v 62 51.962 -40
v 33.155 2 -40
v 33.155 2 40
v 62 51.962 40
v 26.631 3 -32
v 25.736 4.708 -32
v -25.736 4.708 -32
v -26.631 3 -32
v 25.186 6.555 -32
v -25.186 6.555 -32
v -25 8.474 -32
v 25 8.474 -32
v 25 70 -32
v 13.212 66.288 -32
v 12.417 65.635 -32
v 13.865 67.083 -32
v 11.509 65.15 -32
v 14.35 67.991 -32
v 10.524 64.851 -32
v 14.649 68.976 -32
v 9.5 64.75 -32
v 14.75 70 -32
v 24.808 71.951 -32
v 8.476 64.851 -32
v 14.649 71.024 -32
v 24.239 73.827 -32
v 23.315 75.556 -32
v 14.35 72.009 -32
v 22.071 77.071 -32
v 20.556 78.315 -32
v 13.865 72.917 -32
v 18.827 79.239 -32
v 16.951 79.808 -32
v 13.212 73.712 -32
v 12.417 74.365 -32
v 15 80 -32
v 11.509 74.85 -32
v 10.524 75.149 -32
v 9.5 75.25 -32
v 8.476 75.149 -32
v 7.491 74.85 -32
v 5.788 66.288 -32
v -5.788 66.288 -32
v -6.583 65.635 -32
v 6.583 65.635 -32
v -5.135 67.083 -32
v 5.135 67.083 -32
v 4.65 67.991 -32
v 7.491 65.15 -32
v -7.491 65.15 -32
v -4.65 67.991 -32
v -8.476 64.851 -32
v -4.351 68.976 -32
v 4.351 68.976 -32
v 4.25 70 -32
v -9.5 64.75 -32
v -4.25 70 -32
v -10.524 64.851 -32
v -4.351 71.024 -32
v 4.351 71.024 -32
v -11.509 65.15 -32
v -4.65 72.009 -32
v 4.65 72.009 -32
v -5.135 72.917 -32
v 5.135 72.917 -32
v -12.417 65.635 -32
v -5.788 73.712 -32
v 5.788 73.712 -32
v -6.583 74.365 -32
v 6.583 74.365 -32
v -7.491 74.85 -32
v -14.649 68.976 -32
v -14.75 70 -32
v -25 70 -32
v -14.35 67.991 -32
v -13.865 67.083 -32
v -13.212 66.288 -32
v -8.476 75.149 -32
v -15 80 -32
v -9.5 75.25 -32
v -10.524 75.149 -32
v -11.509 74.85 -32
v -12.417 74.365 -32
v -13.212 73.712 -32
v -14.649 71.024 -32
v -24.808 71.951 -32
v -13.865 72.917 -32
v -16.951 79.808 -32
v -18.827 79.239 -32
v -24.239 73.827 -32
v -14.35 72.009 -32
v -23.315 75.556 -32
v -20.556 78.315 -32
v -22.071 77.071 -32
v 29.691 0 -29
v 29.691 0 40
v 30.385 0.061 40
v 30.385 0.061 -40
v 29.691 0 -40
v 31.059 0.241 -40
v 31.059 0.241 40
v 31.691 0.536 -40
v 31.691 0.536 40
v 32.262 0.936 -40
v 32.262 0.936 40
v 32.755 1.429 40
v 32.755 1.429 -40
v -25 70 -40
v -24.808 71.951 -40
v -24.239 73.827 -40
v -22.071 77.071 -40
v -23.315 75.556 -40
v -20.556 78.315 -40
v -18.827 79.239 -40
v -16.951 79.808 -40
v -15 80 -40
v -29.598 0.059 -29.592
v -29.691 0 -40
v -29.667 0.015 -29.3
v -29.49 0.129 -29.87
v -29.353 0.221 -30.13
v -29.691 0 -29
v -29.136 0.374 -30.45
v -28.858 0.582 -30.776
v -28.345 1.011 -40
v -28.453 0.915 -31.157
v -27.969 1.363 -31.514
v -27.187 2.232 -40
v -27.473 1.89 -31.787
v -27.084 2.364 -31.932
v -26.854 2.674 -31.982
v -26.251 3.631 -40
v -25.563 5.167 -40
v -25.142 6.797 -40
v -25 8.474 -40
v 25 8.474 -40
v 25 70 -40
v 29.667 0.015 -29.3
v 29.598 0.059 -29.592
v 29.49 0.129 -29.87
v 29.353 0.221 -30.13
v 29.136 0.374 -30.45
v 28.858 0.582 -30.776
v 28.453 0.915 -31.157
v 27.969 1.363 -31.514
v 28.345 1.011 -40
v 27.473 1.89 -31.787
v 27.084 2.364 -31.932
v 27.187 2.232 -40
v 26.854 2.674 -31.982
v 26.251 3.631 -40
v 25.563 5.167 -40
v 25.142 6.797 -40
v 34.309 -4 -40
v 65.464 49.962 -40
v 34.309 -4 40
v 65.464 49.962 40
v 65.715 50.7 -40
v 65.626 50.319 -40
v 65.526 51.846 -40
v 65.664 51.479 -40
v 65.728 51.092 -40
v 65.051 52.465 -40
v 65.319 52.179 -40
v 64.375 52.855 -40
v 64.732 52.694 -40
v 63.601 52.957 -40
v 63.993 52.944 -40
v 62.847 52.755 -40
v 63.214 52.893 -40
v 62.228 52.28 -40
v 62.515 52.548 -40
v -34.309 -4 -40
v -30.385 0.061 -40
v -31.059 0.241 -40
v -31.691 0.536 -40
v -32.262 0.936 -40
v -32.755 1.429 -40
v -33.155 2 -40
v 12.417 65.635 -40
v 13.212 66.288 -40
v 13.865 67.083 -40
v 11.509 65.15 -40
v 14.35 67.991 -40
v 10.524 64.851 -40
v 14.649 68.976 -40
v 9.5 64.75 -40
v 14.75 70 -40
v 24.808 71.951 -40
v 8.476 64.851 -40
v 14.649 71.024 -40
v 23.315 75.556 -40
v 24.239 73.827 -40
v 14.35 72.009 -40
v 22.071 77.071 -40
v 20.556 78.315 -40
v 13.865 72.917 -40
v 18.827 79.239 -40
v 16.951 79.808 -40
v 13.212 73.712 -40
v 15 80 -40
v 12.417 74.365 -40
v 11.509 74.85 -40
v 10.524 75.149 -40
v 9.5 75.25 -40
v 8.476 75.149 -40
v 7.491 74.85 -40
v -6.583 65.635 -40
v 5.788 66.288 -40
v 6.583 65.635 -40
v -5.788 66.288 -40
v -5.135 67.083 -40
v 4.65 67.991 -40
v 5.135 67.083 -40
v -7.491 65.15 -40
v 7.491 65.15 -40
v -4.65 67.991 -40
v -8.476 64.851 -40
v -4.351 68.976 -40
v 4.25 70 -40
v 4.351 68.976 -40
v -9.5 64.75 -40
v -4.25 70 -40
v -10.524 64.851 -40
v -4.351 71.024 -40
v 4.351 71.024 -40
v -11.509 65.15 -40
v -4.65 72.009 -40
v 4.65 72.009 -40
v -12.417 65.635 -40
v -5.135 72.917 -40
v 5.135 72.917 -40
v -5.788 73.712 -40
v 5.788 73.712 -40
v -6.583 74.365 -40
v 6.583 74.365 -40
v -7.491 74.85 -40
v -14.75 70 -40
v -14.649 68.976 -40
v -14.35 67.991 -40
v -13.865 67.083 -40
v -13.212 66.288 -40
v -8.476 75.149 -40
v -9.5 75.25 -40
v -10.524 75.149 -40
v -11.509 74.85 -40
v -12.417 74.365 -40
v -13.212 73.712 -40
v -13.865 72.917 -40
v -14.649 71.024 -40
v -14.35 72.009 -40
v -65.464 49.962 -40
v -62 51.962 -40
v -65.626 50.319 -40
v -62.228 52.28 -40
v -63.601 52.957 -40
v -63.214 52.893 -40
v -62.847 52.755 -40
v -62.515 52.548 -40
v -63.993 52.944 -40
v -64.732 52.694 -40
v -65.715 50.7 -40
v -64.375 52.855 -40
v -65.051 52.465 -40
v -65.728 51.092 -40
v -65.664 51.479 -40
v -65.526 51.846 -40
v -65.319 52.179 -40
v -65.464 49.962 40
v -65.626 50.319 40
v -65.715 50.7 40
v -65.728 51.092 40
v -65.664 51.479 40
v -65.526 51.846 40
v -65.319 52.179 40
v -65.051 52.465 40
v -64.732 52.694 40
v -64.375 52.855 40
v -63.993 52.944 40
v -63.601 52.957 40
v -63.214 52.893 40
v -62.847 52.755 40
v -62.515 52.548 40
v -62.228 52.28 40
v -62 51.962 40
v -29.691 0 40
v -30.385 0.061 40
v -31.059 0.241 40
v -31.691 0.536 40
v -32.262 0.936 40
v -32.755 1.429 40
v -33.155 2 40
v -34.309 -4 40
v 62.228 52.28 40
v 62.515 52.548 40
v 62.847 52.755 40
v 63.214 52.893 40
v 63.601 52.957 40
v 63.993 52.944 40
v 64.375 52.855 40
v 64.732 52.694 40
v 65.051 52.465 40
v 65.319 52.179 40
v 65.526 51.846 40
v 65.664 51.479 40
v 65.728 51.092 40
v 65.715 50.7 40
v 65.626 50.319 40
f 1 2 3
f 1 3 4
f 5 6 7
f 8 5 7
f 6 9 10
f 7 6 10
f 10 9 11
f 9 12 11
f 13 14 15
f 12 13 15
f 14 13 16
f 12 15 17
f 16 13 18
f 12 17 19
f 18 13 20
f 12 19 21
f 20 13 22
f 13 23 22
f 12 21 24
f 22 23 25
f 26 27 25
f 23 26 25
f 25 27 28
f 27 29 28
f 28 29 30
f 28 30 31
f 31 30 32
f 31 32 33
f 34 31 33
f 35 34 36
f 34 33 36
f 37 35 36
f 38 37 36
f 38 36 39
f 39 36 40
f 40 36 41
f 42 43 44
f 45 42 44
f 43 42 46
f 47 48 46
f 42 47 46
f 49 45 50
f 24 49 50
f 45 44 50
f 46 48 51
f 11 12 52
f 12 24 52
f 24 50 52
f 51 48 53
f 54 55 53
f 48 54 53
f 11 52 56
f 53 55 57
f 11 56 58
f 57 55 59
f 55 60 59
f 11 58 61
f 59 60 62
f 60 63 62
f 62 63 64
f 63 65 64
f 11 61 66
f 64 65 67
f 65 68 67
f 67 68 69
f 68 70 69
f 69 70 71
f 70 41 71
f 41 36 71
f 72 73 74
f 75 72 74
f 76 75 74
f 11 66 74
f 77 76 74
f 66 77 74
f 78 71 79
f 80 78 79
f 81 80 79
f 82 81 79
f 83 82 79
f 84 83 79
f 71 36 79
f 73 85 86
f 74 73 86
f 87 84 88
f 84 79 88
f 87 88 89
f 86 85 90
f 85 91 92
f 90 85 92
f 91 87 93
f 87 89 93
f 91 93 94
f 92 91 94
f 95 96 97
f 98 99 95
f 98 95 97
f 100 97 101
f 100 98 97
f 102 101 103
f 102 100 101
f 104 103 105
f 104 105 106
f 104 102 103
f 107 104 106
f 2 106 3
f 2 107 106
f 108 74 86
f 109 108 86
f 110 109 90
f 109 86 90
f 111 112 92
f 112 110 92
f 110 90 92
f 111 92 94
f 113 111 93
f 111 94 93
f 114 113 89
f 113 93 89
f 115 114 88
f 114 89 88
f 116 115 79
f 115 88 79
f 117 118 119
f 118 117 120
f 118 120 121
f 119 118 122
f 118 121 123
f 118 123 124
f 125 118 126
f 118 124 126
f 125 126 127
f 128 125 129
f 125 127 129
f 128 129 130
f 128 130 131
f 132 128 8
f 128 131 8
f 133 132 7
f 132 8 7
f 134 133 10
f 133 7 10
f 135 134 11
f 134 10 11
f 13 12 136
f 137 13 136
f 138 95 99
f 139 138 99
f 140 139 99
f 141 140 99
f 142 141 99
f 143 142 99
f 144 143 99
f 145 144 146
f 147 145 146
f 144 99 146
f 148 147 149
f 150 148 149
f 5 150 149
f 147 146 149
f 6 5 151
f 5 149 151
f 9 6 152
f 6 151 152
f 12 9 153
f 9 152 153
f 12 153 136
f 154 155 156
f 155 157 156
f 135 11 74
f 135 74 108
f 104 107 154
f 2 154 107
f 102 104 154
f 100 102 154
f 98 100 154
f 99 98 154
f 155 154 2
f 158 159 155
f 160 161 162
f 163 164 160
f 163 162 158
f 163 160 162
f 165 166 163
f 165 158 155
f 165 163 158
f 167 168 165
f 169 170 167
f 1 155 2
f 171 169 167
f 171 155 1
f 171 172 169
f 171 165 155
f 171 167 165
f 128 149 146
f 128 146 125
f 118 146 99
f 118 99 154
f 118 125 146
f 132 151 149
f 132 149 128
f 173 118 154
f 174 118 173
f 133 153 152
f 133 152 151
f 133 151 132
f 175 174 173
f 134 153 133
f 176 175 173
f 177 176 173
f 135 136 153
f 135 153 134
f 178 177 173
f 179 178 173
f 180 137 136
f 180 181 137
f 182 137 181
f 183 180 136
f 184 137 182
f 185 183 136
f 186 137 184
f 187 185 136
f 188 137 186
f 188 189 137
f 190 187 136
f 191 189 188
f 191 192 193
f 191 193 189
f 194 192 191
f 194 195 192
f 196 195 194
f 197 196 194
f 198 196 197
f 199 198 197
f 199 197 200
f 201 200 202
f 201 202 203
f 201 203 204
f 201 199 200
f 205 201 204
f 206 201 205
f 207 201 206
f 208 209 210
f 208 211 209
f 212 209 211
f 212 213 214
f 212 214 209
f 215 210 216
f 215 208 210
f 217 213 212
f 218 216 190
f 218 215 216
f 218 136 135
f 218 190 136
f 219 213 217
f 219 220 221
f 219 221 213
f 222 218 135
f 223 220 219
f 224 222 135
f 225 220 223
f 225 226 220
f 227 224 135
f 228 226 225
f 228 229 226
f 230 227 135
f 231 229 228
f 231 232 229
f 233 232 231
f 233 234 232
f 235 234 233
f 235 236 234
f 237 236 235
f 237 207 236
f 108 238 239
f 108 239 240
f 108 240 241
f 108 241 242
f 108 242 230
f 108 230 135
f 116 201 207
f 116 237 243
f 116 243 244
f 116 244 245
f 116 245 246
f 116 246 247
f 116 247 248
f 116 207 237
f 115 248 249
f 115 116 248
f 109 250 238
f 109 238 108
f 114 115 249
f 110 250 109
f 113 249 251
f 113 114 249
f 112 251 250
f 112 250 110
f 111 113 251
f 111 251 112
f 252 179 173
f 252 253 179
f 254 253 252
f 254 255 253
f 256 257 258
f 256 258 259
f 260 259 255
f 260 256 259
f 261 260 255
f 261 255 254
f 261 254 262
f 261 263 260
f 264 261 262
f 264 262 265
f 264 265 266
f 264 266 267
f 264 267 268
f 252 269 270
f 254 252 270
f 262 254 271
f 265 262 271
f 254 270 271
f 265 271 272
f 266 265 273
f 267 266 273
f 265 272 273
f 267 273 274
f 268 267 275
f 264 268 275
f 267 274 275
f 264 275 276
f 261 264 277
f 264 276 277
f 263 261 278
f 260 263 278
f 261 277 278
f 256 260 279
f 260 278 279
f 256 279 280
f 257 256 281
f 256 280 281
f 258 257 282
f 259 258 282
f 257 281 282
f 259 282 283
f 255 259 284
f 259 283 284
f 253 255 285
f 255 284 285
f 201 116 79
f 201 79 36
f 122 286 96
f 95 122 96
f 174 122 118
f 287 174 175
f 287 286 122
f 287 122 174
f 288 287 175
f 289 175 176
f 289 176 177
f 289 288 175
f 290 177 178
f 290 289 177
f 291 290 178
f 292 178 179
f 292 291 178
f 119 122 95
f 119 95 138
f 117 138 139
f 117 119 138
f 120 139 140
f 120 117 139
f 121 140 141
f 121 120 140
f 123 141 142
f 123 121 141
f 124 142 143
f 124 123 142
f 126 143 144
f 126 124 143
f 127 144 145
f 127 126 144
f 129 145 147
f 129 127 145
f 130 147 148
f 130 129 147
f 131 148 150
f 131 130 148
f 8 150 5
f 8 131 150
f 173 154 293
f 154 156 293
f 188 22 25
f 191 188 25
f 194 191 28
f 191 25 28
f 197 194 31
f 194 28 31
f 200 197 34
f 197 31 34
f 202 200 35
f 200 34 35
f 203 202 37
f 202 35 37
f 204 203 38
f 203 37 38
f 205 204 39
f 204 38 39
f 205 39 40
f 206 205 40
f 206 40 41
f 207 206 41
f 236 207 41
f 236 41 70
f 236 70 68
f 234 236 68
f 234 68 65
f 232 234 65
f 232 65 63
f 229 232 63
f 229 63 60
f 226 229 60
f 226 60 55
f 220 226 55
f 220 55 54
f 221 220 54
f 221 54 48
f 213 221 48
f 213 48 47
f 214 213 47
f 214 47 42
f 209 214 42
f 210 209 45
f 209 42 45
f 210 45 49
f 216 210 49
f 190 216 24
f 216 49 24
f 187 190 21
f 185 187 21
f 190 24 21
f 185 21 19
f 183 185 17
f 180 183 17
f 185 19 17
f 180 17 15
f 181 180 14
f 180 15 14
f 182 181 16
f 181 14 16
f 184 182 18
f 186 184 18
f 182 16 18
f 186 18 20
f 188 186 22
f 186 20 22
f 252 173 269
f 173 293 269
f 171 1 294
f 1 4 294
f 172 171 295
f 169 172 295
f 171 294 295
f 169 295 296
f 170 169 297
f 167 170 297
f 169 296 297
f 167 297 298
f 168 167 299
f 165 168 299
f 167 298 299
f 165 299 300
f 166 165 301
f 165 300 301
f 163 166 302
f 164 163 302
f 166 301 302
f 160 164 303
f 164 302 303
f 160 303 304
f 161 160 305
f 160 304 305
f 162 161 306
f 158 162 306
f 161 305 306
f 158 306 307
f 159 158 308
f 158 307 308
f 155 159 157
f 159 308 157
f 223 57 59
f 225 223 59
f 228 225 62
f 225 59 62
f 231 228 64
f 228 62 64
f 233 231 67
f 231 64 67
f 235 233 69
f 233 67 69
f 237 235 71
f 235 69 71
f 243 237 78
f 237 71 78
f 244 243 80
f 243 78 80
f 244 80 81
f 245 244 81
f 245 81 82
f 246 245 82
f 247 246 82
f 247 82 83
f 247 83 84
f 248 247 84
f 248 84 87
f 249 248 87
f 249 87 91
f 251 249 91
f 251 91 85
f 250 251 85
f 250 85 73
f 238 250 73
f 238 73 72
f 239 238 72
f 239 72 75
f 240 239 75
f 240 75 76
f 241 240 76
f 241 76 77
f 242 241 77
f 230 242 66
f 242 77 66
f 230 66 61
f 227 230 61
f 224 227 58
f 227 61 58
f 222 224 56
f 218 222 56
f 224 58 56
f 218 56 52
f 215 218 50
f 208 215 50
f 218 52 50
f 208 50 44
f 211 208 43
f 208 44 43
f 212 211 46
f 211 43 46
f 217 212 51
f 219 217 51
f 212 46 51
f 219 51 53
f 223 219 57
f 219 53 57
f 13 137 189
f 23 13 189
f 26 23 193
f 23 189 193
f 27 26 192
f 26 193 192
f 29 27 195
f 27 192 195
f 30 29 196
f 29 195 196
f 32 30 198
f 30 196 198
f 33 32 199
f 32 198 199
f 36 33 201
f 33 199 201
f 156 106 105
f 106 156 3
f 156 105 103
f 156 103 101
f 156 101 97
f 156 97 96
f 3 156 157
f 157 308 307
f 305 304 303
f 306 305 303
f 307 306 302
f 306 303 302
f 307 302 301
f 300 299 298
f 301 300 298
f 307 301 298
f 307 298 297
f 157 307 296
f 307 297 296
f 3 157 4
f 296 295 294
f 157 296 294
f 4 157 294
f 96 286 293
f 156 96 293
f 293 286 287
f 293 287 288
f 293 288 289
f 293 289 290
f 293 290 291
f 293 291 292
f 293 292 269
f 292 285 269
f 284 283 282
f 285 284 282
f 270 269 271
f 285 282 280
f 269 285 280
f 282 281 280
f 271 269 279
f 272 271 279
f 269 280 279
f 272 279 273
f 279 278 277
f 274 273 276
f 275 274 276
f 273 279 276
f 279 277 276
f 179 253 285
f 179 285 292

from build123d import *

# Parameters (mm, degrees)
BOSS_EXTRUDE2_DEPTH = 40
FILLET1_R           = 4
SKETCH3_W           = 50
SKETCH3_H           = 8
BOSS_EXTRUDE3_DEPTH = 80
SKETCH5_R           = 5.25
CUT_EXTRUDE1_DEPTH  = 127.113847389
FILLET2_R           = 10
FILLET3_R           = 3


with BuildPart() as part:
    # Sketch2 → Boss-Extrude2 (new, symmetric)
    with BuildSketch(Plane.XY):
        with BuildLine():
            Line((-32, 0), (32, 0))
            Line((32, 0), (62, 51.961524227))
            ThreePointArc((62, 51.961524227), (64.732050808, 52.693575035), (65.464101615, 49.961524227))
            Line((65.464101615, 49.961524227), (34.309401077, -4))
            Line((34.309401077, -4), (-34.309401077, -4))
            Line((-34.309401077, -4), (-65.464101615, 49.961524227))
            ThreePointArc((-65.464101615, 49.961524227), (-64.732050808, 52.693575035), (-62, 51.961524227))
            Line((-62, 51.961524227), (-32, 0))
        make_face()
    extrude(amount=BOSS_EXTRUDE2_DEPTH, both=True)

    # Fillet1
    fillet1_edges = [part.edges().sort_by_distance(p)[0] for p in [
        (-32, 0, 0),
        (32, 0, 0),
    ]]
    fillet(fillet1_edges, radius=FILLET1_R)

    # Sketch3 → Boss-Extrude3 (add)
    with BuildSketch(Plane(origin=(0, 0, 0), x_dir=(1, 0, 0), z_dir=(0, 1, 0))):
        with Locations((0, 36)):
            Rectangle(SKETCH3_W, SKETCH3_H)
    extrude(amount=BOSS_EXTRUDE3_DEPTH)

    # Sketch5 → Cut-Extrude1 (cut, through all)
    with BuildSketch(Plane.XY.offset(-32)):
        with Locations((-9.5, 70)):
            Circle(SKETCH5_R)
        with Locations((9.5, 70)):
            Circle(SKETCH5_R)
    extrude(amount=-CUT_EXTRUDE1_DEPTH, mode=Mode.SUBTRACT)

    # Fillet2
    # the kernel refuses this fillet: 10 mm, written as the material it adds along each edge
    with BuildSketch(Plane(origin=(25, 0, -40), x_dir=(1, 0, 0), z_dir=(0, 0, 1)), Plane(origin=(-25, 0, -32), x_dir=(-1, 0, 0), z_dir=(0, 0, -1))) as fillet2_piece_1:
        with BuildLine():
            CenterArc((10, 8.474093474), FILLET2_R, 180, 57.931003855)
            Line((0, 8.474093474), (0, 0))
            Line((0, 0), (4.690598923, 0))
        make_face()
    extrude(amount=8)
    # the kernel refuses this fillet: 10 mm, written as the material it takes off along each edge
    with BuildSketch(Plane(origin=(25, 80, -65), x_dir=(0, -1, 0), z_dir=(0, 0, 1))) as fillet2_2_piece_1:
        with BuildLine():
            CenterArc((FILLET2_R, -FILLET2_R), FILLET2_R, 90, 90)
            Line((0, -FILLET2_R), (0, 0))
            Line((0, 0), (FILLET2_R, 0))
        make_face()
    extrude(amount=58, mode=Mode.SUBTRACT)
    with BuildSketch(Plane(origin=(-25, 80, -7), x_dir=(1, 0, 0), z_dir=(0, 0, -1))) as fillet2_2_piece_2:
        with BuildLine():
            CenterArc((FILLET2_R, FILLET2_R), FILLET2_R, 180, 90)
            Line((0, FILLET2_R), (0, 0))
            Line((0, 0), (FILLET2_R, 0))
        make_face()
    extrude(amount=58, mode=Mode.SUBTRACT)

    # Fillet3
    # the kernel refuses this fillet: 3 mm, written as the material it adds along each edge
    with BuildSketch(Plane(origin=(-37.190598923, 0, -32), x_dir=(0, 1, 0), z_dir=(1, 0, 0))) as fillet3_piece_1_section:
        with BuildLine():
            CenterArc((FILLET3_R, FILLET3_R), FILLET3_R, 180, 90)
            Line((0, FILLET3_R), (0, 0))
            Line((0, 0), (FILLET3_R, 0))
        make_face()
    fillet3_piece_1 = extrude(amount=74.381197846, mode=Mode.PRIVATE)
    fillet3_piece_1 = fillet3_piece_1 - Plane(origin=(35, 8.474093474, -32), x_dir=(1, 0, 0), z_dir=(0, 0, -1)) * Cylinder(10, 161, mode=Mode.PRIVATE)
    fillet3_piece_1 = fillet3_piece_1 - Plane(origin=(-35, 8.474093474, -32), x_dir=(-1, 0, 0), z_dir=(0, 0, 1)) * Cylinder(10, 161, mode=Mode.PRIVATE)
    add(fillet3_piece_1)


solid = part.part
